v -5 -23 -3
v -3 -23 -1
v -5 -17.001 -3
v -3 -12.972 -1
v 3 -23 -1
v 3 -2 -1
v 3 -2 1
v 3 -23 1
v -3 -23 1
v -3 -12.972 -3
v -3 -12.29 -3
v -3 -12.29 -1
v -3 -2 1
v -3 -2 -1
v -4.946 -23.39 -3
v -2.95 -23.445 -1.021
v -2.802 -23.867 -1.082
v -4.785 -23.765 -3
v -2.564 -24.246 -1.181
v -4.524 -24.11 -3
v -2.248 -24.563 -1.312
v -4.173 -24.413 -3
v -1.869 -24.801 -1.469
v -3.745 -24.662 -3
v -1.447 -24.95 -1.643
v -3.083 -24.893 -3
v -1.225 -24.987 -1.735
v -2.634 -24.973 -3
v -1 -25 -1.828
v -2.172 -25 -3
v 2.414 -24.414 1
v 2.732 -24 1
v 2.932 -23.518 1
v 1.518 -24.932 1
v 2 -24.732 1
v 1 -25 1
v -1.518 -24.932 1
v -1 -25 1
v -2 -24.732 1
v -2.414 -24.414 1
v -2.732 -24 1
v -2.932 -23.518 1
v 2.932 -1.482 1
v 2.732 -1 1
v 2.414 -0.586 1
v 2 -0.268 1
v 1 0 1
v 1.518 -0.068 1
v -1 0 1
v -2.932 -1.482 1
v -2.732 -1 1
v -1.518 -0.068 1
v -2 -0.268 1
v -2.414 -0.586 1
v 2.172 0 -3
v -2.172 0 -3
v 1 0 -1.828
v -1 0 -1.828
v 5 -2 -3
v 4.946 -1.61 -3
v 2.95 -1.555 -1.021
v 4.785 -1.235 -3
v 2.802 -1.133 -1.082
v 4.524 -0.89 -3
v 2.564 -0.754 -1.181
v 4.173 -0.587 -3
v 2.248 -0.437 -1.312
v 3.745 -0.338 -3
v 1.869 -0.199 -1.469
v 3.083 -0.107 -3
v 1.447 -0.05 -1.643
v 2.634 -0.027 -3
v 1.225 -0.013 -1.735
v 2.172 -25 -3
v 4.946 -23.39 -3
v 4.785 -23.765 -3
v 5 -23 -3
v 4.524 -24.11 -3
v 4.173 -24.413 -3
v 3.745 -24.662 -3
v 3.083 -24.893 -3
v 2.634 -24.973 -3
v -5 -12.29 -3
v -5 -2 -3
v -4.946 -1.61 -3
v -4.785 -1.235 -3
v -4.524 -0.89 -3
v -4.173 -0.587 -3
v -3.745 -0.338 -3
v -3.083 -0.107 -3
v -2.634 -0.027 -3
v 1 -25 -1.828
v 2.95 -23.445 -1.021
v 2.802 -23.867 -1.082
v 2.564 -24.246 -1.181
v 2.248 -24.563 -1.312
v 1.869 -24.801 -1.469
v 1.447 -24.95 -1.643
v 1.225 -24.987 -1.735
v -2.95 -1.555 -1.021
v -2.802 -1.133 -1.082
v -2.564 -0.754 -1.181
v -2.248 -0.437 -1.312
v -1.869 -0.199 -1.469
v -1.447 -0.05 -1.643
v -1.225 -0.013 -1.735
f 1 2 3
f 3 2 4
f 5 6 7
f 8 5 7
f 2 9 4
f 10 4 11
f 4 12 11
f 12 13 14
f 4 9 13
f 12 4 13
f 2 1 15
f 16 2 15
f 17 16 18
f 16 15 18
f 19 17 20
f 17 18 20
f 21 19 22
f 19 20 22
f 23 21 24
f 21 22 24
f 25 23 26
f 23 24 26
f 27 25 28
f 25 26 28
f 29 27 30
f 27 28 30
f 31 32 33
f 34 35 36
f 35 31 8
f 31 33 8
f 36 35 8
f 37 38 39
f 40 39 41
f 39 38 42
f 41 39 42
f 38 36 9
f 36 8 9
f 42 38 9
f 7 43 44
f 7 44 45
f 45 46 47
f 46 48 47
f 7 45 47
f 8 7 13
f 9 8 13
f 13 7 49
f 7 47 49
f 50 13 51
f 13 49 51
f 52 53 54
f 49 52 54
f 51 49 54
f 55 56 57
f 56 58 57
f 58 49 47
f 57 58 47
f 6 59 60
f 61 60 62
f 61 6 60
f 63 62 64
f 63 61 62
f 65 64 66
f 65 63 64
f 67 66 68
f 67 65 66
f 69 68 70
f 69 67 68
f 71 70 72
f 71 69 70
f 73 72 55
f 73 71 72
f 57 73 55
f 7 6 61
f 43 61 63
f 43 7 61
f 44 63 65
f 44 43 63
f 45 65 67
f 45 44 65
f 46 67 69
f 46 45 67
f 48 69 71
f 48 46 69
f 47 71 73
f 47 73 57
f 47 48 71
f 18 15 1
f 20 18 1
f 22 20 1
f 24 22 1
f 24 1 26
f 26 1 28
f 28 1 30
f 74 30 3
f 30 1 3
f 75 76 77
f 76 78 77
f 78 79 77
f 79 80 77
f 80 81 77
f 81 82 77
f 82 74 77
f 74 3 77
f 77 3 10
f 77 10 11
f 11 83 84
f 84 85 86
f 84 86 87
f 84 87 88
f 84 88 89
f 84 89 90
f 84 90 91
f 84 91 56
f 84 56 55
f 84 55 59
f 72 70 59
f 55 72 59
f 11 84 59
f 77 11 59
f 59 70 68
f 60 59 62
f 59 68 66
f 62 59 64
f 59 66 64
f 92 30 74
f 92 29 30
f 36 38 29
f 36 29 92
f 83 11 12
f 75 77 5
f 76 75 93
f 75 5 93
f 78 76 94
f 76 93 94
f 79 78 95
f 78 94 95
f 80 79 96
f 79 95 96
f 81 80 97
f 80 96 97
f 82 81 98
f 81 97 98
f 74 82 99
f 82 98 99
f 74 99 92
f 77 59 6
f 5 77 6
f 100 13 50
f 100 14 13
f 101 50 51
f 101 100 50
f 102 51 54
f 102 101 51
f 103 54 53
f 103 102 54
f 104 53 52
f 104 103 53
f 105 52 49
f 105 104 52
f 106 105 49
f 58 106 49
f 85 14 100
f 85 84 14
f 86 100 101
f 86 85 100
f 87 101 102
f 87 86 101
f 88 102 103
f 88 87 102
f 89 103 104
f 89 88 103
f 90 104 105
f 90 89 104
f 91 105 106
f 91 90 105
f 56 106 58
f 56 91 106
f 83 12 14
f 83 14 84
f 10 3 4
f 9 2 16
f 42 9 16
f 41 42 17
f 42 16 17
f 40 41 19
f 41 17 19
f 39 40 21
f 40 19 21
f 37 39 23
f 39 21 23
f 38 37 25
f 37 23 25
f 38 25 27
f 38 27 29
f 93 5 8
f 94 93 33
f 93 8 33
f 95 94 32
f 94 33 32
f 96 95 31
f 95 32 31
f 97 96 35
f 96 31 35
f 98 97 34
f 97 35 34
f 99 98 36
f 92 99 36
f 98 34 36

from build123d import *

# Parameters (mm, degrees)
F1_DEPTH = 25
F2_R     = 2
F4_DEPTH = 25


with BuildPart() as f1:
    # F0 (on Front) → F1 (new body)
    with BuildSketch(Plane.XZ):
        Polygon((3, 0), (0, 0), (-3, 0), (-3, -1), (-5, -3), (5, -3), (3, -1), align=None)
        Polygon((-3, 0), (0, 0), (3, 0), (3, 1), (-3, 1), align=None)
    extrude(amount=F1_DEPTH)

    # F2
    f2_edges = [f1.edges().sort_by_distance(p)[0] for p in [
        (-3, -25, 0),
        (-4, -25, -2),
        (4, -25, -2),
        (3, -25, 0),
        (-4, 0, -2),
        (3, 0, 0),
        (4, 0, -2),
        (-3, 0, 0),
    ]]
    fillet(f2_edges, radius=F2_R)

    # F3 (on face) → F4 (cut)
    with BuildSketch(Plane.XY.offset(1)):
        Polygon((-3, -12.972297), (-3, -12.5), (-3, -12.29), (-7.69, -12.29), (-7.69, -19.71), (-6.344625, -19.71), align=None)
        Polygon((-7.48, -12.5), (-3, -12.5), (-6.47483, -19.5), (-7.48, -19.5), align=None, mode=Mode.SUBTRACT)
        Polygon((-6.47483, -19.5), (-3, -12.5), (-7.48, -12.5), (-7.48, -19.5), align=None)
    extrude(amount=-F4_DEPTH, mode=Mode.SUBTRACT)


solid = f1.part
